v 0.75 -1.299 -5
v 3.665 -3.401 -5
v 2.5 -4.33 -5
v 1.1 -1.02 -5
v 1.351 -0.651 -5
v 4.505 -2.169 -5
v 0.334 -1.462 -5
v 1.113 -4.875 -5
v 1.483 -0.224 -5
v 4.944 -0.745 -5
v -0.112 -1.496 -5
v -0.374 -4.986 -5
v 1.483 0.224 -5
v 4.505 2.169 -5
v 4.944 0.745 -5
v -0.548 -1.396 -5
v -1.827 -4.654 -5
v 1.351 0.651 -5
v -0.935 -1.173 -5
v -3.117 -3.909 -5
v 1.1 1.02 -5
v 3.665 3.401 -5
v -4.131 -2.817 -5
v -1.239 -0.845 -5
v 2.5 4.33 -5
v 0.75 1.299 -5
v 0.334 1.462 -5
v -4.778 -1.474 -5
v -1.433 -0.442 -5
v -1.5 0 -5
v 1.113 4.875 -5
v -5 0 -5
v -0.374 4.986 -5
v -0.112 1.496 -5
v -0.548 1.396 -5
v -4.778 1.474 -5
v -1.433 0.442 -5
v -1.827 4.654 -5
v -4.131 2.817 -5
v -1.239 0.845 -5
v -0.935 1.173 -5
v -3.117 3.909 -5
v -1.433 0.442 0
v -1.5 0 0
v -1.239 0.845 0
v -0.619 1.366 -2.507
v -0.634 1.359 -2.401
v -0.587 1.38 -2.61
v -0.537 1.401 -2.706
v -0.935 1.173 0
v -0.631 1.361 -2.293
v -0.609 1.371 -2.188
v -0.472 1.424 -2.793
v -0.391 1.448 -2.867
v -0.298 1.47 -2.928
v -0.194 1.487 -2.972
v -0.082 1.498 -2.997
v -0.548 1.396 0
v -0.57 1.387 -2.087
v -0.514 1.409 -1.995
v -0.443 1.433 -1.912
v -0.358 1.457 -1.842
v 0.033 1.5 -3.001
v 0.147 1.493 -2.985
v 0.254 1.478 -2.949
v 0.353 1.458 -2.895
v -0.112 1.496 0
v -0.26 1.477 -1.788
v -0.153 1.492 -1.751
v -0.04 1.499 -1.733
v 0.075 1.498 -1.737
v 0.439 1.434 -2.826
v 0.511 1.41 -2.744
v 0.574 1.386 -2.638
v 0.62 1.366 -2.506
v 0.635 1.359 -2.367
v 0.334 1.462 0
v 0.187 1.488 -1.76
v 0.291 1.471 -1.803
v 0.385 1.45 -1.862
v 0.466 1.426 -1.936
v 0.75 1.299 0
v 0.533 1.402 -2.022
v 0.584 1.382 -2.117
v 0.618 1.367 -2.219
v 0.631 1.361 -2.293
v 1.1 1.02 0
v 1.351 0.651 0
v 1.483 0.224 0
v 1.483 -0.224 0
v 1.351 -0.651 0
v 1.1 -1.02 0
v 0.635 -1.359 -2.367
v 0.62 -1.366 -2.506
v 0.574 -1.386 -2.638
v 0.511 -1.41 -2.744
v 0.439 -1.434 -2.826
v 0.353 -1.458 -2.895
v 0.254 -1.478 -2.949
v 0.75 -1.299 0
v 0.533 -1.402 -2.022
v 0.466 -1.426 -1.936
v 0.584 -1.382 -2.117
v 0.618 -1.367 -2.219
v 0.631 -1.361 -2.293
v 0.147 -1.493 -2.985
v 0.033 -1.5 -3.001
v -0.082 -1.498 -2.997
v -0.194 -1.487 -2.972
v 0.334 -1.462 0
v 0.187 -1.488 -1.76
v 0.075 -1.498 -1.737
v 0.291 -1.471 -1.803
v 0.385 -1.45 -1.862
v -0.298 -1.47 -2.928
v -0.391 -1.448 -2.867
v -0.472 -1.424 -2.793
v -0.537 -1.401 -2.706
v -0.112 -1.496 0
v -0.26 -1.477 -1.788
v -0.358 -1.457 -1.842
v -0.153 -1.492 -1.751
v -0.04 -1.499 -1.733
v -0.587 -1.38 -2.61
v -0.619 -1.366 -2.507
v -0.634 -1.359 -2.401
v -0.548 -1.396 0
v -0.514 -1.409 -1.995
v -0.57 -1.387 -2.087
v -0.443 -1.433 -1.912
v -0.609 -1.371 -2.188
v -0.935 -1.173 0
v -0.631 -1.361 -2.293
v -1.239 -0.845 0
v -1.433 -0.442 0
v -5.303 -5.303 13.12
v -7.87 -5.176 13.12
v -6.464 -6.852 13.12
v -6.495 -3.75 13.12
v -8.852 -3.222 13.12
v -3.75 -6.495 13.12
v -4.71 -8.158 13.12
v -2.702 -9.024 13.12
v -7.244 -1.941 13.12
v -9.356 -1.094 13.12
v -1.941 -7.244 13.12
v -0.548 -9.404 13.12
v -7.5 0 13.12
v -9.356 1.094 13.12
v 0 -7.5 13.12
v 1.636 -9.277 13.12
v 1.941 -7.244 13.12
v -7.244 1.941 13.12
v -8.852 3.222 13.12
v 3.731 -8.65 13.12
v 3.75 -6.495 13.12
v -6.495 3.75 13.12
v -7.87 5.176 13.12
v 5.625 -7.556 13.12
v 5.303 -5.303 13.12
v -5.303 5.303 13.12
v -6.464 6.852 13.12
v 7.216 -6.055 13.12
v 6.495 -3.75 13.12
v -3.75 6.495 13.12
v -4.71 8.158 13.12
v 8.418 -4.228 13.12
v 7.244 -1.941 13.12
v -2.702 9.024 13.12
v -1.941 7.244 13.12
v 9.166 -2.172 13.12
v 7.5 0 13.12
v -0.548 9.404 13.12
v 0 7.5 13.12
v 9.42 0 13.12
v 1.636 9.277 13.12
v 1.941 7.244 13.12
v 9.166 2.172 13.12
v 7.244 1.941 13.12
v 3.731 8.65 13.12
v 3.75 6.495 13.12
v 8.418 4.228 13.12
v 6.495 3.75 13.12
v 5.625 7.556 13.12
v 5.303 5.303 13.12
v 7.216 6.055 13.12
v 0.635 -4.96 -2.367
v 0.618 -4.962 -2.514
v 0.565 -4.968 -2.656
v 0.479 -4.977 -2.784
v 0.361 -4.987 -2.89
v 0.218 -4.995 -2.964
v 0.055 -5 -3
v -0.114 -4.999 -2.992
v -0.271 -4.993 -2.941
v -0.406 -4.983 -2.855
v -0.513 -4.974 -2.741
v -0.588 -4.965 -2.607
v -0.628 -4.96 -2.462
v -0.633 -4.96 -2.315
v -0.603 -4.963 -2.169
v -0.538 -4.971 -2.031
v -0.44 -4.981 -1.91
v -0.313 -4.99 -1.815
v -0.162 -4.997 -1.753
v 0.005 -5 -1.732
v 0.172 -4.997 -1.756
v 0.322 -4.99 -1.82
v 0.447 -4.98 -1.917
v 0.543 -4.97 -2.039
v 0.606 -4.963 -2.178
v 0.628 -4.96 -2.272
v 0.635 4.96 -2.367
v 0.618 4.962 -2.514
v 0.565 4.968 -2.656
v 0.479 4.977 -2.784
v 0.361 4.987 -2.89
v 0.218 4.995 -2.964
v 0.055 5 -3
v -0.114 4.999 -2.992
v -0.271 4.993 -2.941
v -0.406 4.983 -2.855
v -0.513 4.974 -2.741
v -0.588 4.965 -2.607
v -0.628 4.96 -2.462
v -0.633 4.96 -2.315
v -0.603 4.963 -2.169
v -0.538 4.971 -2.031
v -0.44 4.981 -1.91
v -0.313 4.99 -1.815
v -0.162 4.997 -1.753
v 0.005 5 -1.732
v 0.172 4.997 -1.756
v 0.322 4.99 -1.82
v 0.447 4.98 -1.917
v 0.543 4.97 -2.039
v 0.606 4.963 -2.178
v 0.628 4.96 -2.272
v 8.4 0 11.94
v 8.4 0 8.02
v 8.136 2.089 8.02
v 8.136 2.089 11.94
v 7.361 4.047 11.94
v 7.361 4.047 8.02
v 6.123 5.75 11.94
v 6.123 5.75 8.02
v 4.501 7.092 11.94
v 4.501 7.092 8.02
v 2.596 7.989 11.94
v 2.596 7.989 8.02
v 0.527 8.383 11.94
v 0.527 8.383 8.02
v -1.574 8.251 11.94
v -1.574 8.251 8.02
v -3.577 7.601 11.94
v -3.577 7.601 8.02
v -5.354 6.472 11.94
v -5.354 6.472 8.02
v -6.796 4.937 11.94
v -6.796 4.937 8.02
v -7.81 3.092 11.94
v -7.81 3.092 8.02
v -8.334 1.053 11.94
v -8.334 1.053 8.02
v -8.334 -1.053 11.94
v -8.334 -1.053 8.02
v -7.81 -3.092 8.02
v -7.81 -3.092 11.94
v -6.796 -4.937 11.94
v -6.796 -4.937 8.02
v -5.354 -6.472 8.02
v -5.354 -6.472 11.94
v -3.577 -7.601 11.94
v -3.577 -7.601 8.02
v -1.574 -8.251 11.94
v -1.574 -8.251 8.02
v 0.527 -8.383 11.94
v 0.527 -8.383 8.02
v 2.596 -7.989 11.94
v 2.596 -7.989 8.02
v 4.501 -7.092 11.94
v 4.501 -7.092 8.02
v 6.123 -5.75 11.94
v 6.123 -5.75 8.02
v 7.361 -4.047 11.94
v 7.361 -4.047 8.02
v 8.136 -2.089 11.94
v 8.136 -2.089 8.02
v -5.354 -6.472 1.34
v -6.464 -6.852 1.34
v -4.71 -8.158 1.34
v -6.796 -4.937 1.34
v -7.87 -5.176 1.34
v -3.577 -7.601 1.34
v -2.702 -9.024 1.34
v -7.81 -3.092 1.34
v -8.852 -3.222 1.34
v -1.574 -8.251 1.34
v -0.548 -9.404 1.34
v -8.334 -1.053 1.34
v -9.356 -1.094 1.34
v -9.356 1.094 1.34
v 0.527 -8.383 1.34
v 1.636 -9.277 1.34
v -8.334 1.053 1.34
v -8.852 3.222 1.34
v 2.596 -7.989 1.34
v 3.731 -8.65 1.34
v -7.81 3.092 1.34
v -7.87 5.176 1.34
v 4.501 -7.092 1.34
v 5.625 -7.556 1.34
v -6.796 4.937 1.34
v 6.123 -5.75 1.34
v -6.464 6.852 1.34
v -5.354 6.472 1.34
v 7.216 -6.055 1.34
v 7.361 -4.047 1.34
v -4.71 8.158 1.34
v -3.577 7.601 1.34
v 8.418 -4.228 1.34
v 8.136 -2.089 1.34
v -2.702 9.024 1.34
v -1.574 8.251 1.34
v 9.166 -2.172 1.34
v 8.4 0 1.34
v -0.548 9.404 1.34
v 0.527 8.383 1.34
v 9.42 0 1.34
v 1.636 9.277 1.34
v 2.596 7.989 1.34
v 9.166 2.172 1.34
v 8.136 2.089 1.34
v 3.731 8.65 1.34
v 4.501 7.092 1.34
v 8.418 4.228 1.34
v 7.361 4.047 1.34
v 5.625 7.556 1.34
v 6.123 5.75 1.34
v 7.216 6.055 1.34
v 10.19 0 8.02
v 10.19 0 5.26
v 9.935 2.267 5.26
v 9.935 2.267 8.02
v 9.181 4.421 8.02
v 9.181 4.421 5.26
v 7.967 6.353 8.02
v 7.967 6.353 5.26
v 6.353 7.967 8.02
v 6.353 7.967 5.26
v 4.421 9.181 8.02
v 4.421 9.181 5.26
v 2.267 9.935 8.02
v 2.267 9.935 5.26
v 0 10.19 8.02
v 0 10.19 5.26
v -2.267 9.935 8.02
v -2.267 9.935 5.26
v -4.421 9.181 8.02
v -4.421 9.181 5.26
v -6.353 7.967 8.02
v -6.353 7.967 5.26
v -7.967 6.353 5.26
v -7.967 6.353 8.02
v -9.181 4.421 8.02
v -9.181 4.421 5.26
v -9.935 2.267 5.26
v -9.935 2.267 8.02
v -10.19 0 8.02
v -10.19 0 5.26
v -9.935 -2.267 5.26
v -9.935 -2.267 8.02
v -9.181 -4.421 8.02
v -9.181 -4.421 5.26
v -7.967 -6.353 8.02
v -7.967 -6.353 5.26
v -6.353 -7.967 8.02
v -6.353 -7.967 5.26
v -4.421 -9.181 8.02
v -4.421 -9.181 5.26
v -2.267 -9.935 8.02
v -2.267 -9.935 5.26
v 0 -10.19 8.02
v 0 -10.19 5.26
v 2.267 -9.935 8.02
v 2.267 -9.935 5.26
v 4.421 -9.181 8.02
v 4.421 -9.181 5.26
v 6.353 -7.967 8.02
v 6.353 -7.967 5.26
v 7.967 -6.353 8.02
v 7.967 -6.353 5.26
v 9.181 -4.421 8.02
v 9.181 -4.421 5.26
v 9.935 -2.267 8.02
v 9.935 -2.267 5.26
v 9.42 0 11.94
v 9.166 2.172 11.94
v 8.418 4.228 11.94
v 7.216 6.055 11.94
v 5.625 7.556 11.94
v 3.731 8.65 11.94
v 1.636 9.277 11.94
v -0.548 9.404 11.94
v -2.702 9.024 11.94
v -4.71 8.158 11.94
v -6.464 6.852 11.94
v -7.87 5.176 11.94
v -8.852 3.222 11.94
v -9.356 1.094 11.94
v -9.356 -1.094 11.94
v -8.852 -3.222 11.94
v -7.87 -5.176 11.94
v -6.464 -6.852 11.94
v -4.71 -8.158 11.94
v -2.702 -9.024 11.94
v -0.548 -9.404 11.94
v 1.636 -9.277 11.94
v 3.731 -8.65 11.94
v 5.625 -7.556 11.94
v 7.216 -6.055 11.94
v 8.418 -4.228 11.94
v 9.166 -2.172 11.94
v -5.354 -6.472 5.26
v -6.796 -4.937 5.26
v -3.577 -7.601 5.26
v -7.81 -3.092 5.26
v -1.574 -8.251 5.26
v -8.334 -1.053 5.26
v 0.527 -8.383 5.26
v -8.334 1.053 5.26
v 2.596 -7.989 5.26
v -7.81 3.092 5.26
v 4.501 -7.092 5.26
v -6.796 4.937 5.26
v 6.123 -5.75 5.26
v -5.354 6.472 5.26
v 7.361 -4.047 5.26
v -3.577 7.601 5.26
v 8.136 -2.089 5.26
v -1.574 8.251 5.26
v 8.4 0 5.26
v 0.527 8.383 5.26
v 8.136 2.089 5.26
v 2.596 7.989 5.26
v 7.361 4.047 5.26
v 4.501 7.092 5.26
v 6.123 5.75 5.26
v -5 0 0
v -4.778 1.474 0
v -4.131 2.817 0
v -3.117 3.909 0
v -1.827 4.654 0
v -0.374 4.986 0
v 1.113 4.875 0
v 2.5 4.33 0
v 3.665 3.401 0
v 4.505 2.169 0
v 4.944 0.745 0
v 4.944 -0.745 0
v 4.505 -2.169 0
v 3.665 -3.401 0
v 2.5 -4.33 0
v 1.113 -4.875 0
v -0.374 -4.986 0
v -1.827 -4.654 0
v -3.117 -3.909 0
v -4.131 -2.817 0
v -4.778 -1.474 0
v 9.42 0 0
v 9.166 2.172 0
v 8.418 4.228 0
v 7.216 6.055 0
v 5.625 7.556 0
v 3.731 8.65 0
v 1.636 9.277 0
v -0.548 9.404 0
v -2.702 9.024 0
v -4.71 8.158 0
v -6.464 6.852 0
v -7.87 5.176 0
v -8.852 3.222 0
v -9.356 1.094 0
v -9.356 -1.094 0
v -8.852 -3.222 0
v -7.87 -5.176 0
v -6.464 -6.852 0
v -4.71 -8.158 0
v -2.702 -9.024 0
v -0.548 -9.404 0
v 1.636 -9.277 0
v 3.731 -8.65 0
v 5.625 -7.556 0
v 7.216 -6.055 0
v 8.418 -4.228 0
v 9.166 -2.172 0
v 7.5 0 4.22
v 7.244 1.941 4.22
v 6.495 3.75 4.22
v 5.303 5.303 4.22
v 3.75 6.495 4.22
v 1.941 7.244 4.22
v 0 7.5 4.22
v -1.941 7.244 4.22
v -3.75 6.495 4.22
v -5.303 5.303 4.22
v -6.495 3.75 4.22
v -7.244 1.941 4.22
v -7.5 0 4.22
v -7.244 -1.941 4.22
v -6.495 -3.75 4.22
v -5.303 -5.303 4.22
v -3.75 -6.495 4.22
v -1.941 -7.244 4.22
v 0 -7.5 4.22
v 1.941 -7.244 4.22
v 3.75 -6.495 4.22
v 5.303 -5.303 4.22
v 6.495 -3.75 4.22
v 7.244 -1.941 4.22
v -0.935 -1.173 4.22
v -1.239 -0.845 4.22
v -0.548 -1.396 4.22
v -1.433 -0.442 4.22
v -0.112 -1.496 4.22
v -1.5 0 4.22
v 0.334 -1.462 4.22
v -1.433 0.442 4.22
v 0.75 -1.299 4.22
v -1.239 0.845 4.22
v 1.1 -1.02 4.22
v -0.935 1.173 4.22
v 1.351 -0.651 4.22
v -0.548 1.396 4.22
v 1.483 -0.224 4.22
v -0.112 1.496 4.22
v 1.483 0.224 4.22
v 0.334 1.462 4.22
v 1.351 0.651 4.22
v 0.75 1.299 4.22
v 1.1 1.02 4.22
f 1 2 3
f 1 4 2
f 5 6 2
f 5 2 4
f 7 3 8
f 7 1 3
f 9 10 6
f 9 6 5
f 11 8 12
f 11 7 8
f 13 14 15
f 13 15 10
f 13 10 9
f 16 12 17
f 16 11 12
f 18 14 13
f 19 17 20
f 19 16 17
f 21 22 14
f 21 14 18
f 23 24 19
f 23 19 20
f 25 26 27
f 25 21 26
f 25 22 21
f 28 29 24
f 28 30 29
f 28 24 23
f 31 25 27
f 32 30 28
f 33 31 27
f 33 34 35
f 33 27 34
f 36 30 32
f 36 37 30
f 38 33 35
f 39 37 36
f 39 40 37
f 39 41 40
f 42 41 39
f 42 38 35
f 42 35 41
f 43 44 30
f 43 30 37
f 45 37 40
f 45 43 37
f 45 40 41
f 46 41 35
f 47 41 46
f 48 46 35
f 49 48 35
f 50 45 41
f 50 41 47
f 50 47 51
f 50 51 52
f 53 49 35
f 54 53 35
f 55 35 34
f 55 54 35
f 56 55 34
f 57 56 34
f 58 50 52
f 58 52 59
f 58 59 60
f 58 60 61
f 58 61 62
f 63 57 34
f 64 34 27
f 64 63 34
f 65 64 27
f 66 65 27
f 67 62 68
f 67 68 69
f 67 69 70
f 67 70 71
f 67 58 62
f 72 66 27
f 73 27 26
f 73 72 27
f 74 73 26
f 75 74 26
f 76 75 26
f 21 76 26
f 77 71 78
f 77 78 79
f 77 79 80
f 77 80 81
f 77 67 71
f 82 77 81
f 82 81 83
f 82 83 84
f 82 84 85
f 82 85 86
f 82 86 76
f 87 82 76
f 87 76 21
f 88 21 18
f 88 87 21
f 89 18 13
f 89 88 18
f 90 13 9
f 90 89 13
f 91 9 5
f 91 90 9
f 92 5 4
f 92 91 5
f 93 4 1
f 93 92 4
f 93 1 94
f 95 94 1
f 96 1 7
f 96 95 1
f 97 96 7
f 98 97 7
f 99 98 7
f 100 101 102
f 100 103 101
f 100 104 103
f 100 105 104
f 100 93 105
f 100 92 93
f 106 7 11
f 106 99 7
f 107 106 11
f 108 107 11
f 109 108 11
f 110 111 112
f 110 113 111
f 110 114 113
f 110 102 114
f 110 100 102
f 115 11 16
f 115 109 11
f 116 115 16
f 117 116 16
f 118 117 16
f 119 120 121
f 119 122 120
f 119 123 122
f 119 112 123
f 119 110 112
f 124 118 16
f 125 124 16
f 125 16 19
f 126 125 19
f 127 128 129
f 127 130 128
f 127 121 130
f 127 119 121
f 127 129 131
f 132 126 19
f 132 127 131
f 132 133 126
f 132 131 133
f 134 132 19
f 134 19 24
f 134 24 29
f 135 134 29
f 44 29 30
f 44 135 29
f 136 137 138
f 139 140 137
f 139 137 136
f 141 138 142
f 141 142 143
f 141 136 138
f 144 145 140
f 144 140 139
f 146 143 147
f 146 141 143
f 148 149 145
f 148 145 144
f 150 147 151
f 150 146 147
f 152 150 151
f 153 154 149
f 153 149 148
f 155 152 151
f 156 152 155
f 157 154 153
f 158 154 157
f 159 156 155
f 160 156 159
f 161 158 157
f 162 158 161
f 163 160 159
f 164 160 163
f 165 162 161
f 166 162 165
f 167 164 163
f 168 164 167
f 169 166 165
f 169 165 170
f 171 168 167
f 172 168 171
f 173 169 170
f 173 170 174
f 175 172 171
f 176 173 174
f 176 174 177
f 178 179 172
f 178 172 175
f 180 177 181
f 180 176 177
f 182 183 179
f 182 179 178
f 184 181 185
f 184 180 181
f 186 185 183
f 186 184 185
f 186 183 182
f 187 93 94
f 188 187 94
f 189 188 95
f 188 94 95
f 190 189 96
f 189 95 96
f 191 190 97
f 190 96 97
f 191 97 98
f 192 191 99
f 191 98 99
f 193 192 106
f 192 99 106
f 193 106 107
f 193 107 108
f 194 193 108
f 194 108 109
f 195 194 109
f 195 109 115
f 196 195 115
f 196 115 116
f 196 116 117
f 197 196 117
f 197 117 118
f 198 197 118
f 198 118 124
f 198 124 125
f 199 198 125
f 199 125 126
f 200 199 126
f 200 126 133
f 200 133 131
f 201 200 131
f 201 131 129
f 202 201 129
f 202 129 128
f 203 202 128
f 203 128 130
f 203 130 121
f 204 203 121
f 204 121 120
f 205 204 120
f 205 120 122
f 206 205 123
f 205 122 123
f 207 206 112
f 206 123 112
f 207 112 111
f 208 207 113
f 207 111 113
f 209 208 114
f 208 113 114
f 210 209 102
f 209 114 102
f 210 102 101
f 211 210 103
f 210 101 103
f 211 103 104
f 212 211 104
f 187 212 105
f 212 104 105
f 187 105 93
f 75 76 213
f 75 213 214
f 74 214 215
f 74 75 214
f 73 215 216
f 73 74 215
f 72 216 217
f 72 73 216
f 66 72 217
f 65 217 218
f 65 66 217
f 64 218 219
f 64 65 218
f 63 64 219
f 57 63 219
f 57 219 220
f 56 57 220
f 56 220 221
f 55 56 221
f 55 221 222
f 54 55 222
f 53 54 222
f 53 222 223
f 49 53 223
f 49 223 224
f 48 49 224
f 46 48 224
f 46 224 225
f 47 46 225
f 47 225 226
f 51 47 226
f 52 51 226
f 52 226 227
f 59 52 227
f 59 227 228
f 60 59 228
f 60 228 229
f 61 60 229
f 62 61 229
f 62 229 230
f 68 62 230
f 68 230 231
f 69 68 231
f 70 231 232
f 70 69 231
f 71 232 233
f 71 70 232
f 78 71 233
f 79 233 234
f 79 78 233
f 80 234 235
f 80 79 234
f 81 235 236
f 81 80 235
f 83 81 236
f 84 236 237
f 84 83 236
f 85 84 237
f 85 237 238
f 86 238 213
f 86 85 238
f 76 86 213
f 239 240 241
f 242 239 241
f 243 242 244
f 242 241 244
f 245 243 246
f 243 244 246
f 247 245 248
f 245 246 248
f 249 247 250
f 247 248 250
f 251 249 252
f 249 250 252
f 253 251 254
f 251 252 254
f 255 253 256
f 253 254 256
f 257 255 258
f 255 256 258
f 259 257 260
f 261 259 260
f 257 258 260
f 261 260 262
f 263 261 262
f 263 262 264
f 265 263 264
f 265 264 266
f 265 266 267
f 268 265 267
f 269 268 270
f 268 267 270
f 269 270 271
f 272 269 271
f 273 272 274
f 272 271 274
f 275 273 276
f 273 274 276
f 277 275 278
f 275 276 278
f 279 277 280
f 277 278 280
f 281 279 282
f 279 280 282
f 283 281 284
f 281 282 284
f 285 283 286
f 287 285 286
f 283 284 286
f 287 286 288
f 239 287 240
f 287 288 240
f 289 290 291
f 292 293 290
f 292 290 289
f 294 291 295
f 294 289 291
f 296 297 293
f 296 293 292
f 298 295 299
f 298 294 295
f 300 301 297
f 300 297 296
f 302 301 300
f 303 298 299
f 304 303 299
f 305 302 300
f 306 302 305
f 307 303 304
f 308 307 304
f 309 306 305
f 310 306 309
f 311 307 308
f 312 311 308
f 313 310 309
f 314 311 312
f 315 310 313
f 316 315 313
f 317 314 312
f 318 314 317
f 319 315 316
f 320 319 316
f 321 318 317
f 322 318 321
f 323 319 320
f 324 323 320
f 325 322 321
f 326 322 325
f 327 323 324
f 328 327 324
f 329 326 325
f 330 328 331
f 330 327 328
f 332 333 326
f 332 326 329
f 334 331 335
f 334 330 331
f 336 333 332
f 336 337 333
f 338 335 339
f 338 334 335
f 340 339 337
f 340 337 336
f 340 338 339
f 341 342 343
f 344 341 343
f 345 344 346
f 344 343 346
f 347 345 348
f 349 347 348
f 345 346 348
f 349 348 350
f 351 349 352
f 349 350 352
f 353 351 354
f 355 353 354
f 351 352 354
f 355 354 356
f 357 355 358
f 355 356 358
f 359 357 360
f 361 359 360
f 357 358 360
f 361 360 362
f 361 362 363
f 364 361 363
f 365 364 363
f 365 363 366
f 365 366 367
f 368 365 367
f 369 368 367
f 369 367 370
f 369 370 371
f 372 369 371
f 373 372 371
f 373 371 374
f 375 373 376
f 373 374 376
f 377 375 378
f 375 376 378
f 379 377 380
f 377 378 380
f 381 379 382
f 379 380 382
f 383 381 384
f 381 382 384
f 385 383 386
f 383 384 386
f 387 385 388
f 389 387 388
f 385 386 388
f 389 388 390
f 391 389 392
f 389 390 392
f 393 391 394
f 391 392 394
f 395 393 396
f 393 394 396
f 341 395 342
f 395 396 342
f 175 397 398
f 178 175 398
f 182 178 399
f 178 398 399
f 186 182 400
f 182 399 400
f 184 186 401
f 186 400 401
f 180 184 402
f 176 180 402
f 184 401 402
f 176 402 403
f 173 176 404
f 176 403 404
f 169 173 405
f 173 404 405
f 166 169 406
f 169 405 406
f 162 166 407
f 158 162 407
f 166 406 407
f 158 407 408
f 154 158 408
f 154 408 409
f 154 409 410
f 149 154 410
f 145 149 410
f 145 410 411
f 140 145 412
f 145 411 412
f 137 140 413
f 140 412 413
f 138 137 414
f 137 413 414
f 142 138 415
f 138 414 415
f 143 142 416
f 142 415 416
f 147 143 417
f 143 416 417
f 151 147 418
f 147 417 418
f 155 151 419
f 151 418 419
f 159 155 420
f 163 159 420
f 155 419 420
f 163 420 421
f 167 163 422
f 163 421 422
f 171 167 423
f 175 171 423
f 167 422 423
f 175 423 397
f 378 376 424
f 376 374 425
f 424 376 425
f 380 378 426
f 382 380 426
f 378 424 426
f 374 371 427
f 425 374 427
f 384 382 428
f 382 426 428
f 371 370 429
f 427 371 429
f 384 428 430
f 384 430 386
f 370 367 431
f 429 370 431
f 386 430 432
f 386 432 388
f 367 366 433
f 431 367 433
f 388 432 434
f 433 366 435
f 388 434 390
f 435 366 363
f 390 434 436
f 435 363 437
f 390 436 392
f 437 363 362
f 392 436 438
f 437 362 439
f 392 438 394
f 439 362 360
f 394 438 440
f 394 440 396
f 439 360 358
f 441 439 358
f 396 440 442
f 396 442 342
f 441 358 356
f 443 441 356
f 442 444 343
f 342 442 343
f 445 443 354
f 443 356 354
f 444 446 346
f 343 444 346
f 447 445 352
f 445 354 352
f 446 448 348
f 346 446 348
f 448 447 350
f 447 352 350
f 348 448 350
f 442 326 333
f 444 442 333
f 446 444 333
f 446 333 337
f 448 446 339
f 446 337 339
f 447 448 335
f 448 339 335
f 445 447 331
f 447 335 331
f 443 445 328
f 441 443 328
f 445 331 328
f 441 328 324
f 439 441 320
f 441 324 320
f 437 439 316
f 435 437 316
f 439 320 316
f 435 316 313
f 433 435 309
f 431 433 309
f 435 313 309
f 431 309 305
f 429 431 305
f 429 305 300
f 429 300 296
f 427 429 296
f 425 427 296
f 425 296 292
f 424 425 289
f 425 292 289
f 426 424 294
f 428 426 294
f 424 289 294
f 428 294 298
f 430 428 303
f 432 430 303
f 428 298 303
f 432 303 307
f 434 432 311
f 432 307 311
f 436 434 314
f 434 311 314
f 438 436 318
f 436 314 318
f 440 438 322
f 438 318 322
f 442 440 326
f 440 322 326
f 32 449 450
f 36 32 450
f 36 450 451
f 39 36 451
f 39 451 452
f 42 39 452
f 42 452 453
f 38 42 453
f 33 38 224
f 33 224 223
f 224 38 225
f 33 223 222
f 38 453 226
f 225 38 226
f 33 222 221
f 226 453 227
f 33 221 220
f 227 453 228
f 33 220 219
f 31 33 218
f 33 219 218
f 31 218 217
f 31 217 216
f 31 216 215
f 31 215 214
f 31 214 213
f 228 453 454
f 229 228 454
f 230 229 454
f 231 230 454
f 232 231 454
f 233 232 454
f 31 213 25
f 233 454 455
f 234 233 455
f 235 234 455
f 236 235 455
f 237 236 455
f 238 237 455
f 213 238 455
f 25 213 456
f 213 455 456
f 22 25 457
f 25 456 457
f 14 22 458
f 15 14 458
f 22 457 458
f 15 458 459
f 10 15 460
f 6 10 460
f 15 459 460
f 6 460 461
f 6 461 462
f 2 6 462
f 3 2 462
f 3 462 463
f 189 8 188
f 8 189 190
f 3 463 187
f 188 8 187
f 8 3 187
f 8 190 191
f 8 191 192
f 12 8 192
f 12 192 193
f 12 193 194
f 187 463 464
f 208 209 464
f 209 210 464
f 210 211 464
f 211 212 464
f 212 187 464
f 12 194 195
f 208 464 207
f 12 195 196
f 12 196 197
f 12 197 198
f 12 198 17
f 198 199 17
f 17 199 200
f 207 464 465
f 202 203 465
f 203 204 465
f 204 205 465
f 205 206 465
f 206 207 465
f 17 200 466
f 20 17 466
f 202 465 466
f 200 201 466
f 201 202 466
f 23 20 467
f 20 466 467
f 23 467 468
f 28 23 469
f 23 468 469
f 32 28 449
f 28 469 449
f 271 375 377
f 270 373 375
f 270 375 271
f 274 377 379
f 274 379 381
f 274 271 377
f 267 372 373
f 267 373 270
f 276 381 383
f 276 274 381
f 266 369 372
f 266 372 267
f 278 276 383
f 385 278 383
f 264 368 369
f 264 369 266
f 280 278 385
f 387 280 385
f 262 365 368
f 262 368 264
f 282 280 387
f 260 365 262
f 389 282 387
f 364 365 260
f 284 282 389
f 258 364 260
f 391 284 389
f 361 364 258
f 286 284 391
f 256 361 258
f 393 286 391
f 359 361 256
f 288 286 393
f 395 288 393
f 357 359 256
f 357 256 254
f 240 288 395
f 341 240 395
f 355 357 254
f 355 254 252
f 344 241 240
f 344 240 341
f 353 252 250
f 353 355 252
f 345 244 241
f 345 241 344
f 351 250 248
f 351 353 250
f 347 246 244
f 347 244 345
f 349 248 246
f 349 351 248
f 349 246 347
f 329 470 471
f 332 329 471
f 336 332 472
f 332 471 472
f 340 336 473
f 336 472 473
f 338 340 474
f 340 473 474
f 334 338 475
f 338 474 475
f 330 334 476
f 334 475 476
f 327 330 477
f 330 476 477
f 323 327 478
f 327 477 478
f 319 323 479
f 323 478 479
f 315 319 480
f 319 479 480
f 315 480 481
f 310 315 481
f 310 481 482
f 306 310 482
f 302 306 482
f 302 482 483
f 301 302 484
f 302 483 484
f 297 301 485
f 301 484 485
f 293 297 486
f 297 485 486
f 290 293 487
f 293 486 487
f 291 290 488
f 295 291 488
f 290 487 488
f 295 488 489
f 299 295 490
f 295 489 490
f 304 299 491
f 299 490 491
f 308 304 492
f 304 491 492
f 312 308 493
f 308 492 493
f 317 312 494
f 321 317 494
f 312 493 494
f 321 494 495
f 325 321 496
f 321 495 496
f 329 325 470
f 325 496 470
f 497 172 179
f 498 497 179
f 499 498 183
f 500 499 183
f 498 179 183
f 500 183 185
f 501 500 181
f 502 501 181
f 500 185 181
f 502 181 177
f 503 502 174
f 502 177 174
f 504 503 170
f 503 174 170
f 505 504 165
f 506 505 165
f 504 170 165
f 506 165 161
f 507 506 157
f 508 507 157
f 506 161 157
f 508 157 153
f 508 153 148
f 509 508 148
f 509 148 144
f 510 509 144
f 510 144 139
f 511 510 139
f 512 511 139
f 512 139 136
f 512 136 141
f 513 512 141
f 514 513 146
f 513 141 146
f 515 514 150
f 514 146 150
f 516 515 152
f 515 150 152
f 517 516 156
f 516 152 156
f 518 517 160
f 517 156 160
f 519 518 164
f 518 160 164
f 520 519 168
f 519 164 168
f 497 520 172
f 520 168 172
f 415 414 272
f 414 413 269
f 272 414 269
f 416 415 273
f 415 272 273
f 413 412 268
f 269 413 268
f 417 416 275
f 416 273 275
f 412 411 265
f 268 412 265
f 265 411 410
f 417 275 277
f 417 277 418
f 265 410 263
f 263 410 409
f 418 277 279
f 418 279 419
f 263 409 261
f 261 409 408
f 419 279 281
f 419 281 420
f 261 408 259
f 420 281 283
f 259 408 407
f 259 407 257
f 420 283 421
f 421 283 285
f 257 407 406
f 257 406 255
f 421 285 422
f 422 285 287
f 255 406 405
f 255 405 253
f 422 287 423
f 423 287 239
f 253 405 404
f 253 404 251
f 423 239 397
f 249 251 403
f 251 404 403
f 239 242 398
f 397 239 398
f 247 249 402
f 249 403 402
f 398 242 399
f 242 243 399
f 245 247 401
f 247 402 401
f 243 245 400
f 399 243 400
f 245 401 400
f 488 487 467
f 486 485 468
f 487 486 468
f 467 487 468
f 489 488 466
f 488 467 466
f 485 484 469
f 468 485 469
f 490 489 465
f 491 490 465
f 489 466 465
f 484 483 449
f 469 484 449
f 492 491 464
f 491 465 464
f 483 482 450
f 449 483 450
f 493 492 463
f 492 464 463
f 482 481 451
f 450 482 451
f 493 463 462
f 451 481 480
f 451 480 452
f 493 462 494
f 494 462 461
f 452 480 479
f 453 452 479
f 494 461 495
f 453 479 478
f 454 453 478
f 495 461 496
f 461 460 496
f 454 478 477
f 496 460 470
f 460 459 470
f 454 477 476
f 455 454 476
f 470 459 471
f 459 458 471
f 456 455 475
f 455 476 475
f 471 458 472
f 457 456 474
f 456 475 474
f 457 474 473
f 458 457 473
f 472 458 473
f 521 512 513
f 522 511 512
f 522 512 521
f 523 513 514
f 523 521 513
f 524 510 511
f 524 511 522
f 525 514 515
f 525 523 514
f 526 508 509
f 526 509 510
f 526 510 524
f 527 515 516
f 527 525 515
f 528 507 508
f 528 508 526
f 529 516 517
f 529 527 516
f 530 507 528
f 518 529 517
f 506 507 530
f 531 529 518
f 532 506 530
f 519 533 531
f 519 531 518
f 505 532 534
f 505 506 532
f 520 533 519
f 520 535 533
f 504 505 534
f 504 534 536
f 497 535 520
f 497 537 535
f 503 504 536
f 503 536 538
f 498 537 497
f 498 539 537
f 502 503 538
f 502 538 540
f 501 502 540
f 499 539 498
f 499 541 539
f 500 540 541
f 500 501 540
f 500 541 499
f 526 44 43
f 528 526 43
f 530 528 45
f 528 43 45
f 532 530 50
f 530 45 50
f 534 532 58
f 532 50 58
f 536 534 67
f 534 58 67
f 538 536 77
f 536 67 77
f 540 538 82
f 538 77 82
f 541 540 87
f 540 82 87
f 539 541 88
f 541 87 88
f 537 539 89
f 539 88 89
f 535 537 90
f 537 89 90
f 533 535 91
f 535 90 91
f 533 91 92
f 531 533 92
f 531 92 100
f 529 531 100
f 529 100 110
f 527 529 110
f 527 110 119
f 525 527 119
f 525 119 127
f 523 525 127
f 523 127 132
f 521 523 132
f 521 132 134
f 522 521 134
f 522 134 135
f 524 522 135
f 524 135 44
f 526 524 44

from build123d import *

# Parameters (mm, degrees)
SZKIC1_R                    = 9.42
DODANIE_WYCI_GNI_CIE1_DEPTH = 1.34
SZKIC2_R                    = 8.4
DODANIE_WYCI_GNI_CIE2_DEPTH = 3.92
SZKIC3_R                    = 10.19
DODANIE_WYCI_GNI_CIE3_DEPTH = 2.76
SZKIC4_R                    = 8.4
DODANIE_WYCI_GNI_CIE4_DEPTH = 3.92
SZKIC5_R                    = 9.42
DODANIE_WYCI_GNI_CIE5_DEPTH = 1.18
SZKIC6_R                    = 7.5
WYTNIJ_WYCI_GNI_CIE1_DEPTH  = 8.9
WYTNIJ_WYCI_GNI_CIE2_REACH  = 15.12
SZKIC7_R                    = 1.5
CROQUIS1_R                  = 5
CROQUIS1_R_2                = 1.5
SALIENTE_EXTRUIR1_DEPTH     = 5
CROQUIS2_R                  = 0.635
CORTAR_EXTRUIR1_DEPTH       = 11.19
CORTAR_EXTRUIR1_DEPTH_BACK  = 11.19


with BuildPart() as part:
    # Szkic1 → Dodanie-wyciągnięcie1 (new body)
    with BuildSketch(Plane.XY):
        Circle(SZKIC1_R)
    extrude(amount=DODANIE_WYCI_GNI_CIE1_DEPTH)

    # Szkic2 → Dodanie-wyciągnięcie2 (add)
    with BuildSketch(Plane.XY.offset(1.34)):
        Circle(SZKIC2_R)
    extrude(amount=DODANIE_WYCI_GNI_CIE2_DEPTH)

    # Szkic3 → Dodanie-wyciągnięcie3 (add)
    with BuildSketch(Plane.XY.offset(5.26)):
        Circle(SZKIC3_R)
    extrude(amount=DODANIE_WYCI_GNI_CIE3_DEPTH)

    # Szkic4 → Dodanie-wyciągnięcie4 (add)
    with BuildSketch(Plane.XY.offset(8.02)):
        Circle(SZKIC4_R)
    extrude(amount=DODANIE_WYCI_GNI_CIE4_DEPTH)

    # Szkic5 → Dodanie-wyciągnięcie5 (add)
    with BuildSketch(Plane.XY.offset(11.94)):
        Circle(SZKIC5_R)
    extrude(amount=DODANIE_WYCI_GNI_CIE5_DEPTH)

    # Szkic6 → Wytnij-wyciągnięcie1 (cut)
    with BuildSketch(Plane.XY.offset(13.12)):
        Circle(SZKIC6_R)
    extrude(amount=-WYTNIJ_WYCI_GNI_CIE1_DEPTH, mode=Mode.SUBTRACT)

    # Szkic7 → Wytnij-wyciągnięcie2 (cut, up to next)
    with BuildSketch(Plane(origin=(0, 0, 0), x_dir=(-1, 0, 0), z_dir=(0, 0, -1)), mode=Mode.PRIVATE) as wytnij_wyci_gni_cie2_sk1:
        Circle(SZKIC7_R)
    wytnij_wyci_gni_cie2_tool1 = extrude(wytnij_wyci_gni_cie2_sk1.sketch, amount=-WYTNIJ_WYCI_GNI_CIE2_REACH, mode=Mode.PRIVATE) & part.part
    add(wytnij_wyci_gni_cie2_tool1.solids().sort_by_distance((0, 0, 0))[0], mode=Mode.SUBTRACT)

    # Croquis1 → Saliente-Extruir1 (add)
    with BuildSketch(Plane(origin=(0, 0, 0), x_dir=(-1, 0, 0), z_dir=(0, 0, -1))):
        Circle(CROQUIS1_R)
        Circle(CROQUIS1_R_2, mode=Mode.SUBTRACT)
    extrude(amount=SALIENTE_EXTRUIR1_DEPTH)

    # Croquis2 → Cortar-Extruir1 (cut, two sides)
    with BuildSketch(Plane(origin=(0, 0, 0), x_dir=(1, 0, 0), z_dir=(0, 1, 0))) as cortar_extruir1_sk:
        with Locations((0, 2.367182901)):
            Circle(CROQUIS2_R)
    extrude(amount=CORTAR_EXTRUIR1_DEPTH, mode=Mode.SUBTRACT)
    extrude(cortar_extruir1_sk.sketch, amount=-CORTAR_EXTRUIR1_DEPTH_BACK, mode=Mode.SUBTRACT)


solid = part.part
